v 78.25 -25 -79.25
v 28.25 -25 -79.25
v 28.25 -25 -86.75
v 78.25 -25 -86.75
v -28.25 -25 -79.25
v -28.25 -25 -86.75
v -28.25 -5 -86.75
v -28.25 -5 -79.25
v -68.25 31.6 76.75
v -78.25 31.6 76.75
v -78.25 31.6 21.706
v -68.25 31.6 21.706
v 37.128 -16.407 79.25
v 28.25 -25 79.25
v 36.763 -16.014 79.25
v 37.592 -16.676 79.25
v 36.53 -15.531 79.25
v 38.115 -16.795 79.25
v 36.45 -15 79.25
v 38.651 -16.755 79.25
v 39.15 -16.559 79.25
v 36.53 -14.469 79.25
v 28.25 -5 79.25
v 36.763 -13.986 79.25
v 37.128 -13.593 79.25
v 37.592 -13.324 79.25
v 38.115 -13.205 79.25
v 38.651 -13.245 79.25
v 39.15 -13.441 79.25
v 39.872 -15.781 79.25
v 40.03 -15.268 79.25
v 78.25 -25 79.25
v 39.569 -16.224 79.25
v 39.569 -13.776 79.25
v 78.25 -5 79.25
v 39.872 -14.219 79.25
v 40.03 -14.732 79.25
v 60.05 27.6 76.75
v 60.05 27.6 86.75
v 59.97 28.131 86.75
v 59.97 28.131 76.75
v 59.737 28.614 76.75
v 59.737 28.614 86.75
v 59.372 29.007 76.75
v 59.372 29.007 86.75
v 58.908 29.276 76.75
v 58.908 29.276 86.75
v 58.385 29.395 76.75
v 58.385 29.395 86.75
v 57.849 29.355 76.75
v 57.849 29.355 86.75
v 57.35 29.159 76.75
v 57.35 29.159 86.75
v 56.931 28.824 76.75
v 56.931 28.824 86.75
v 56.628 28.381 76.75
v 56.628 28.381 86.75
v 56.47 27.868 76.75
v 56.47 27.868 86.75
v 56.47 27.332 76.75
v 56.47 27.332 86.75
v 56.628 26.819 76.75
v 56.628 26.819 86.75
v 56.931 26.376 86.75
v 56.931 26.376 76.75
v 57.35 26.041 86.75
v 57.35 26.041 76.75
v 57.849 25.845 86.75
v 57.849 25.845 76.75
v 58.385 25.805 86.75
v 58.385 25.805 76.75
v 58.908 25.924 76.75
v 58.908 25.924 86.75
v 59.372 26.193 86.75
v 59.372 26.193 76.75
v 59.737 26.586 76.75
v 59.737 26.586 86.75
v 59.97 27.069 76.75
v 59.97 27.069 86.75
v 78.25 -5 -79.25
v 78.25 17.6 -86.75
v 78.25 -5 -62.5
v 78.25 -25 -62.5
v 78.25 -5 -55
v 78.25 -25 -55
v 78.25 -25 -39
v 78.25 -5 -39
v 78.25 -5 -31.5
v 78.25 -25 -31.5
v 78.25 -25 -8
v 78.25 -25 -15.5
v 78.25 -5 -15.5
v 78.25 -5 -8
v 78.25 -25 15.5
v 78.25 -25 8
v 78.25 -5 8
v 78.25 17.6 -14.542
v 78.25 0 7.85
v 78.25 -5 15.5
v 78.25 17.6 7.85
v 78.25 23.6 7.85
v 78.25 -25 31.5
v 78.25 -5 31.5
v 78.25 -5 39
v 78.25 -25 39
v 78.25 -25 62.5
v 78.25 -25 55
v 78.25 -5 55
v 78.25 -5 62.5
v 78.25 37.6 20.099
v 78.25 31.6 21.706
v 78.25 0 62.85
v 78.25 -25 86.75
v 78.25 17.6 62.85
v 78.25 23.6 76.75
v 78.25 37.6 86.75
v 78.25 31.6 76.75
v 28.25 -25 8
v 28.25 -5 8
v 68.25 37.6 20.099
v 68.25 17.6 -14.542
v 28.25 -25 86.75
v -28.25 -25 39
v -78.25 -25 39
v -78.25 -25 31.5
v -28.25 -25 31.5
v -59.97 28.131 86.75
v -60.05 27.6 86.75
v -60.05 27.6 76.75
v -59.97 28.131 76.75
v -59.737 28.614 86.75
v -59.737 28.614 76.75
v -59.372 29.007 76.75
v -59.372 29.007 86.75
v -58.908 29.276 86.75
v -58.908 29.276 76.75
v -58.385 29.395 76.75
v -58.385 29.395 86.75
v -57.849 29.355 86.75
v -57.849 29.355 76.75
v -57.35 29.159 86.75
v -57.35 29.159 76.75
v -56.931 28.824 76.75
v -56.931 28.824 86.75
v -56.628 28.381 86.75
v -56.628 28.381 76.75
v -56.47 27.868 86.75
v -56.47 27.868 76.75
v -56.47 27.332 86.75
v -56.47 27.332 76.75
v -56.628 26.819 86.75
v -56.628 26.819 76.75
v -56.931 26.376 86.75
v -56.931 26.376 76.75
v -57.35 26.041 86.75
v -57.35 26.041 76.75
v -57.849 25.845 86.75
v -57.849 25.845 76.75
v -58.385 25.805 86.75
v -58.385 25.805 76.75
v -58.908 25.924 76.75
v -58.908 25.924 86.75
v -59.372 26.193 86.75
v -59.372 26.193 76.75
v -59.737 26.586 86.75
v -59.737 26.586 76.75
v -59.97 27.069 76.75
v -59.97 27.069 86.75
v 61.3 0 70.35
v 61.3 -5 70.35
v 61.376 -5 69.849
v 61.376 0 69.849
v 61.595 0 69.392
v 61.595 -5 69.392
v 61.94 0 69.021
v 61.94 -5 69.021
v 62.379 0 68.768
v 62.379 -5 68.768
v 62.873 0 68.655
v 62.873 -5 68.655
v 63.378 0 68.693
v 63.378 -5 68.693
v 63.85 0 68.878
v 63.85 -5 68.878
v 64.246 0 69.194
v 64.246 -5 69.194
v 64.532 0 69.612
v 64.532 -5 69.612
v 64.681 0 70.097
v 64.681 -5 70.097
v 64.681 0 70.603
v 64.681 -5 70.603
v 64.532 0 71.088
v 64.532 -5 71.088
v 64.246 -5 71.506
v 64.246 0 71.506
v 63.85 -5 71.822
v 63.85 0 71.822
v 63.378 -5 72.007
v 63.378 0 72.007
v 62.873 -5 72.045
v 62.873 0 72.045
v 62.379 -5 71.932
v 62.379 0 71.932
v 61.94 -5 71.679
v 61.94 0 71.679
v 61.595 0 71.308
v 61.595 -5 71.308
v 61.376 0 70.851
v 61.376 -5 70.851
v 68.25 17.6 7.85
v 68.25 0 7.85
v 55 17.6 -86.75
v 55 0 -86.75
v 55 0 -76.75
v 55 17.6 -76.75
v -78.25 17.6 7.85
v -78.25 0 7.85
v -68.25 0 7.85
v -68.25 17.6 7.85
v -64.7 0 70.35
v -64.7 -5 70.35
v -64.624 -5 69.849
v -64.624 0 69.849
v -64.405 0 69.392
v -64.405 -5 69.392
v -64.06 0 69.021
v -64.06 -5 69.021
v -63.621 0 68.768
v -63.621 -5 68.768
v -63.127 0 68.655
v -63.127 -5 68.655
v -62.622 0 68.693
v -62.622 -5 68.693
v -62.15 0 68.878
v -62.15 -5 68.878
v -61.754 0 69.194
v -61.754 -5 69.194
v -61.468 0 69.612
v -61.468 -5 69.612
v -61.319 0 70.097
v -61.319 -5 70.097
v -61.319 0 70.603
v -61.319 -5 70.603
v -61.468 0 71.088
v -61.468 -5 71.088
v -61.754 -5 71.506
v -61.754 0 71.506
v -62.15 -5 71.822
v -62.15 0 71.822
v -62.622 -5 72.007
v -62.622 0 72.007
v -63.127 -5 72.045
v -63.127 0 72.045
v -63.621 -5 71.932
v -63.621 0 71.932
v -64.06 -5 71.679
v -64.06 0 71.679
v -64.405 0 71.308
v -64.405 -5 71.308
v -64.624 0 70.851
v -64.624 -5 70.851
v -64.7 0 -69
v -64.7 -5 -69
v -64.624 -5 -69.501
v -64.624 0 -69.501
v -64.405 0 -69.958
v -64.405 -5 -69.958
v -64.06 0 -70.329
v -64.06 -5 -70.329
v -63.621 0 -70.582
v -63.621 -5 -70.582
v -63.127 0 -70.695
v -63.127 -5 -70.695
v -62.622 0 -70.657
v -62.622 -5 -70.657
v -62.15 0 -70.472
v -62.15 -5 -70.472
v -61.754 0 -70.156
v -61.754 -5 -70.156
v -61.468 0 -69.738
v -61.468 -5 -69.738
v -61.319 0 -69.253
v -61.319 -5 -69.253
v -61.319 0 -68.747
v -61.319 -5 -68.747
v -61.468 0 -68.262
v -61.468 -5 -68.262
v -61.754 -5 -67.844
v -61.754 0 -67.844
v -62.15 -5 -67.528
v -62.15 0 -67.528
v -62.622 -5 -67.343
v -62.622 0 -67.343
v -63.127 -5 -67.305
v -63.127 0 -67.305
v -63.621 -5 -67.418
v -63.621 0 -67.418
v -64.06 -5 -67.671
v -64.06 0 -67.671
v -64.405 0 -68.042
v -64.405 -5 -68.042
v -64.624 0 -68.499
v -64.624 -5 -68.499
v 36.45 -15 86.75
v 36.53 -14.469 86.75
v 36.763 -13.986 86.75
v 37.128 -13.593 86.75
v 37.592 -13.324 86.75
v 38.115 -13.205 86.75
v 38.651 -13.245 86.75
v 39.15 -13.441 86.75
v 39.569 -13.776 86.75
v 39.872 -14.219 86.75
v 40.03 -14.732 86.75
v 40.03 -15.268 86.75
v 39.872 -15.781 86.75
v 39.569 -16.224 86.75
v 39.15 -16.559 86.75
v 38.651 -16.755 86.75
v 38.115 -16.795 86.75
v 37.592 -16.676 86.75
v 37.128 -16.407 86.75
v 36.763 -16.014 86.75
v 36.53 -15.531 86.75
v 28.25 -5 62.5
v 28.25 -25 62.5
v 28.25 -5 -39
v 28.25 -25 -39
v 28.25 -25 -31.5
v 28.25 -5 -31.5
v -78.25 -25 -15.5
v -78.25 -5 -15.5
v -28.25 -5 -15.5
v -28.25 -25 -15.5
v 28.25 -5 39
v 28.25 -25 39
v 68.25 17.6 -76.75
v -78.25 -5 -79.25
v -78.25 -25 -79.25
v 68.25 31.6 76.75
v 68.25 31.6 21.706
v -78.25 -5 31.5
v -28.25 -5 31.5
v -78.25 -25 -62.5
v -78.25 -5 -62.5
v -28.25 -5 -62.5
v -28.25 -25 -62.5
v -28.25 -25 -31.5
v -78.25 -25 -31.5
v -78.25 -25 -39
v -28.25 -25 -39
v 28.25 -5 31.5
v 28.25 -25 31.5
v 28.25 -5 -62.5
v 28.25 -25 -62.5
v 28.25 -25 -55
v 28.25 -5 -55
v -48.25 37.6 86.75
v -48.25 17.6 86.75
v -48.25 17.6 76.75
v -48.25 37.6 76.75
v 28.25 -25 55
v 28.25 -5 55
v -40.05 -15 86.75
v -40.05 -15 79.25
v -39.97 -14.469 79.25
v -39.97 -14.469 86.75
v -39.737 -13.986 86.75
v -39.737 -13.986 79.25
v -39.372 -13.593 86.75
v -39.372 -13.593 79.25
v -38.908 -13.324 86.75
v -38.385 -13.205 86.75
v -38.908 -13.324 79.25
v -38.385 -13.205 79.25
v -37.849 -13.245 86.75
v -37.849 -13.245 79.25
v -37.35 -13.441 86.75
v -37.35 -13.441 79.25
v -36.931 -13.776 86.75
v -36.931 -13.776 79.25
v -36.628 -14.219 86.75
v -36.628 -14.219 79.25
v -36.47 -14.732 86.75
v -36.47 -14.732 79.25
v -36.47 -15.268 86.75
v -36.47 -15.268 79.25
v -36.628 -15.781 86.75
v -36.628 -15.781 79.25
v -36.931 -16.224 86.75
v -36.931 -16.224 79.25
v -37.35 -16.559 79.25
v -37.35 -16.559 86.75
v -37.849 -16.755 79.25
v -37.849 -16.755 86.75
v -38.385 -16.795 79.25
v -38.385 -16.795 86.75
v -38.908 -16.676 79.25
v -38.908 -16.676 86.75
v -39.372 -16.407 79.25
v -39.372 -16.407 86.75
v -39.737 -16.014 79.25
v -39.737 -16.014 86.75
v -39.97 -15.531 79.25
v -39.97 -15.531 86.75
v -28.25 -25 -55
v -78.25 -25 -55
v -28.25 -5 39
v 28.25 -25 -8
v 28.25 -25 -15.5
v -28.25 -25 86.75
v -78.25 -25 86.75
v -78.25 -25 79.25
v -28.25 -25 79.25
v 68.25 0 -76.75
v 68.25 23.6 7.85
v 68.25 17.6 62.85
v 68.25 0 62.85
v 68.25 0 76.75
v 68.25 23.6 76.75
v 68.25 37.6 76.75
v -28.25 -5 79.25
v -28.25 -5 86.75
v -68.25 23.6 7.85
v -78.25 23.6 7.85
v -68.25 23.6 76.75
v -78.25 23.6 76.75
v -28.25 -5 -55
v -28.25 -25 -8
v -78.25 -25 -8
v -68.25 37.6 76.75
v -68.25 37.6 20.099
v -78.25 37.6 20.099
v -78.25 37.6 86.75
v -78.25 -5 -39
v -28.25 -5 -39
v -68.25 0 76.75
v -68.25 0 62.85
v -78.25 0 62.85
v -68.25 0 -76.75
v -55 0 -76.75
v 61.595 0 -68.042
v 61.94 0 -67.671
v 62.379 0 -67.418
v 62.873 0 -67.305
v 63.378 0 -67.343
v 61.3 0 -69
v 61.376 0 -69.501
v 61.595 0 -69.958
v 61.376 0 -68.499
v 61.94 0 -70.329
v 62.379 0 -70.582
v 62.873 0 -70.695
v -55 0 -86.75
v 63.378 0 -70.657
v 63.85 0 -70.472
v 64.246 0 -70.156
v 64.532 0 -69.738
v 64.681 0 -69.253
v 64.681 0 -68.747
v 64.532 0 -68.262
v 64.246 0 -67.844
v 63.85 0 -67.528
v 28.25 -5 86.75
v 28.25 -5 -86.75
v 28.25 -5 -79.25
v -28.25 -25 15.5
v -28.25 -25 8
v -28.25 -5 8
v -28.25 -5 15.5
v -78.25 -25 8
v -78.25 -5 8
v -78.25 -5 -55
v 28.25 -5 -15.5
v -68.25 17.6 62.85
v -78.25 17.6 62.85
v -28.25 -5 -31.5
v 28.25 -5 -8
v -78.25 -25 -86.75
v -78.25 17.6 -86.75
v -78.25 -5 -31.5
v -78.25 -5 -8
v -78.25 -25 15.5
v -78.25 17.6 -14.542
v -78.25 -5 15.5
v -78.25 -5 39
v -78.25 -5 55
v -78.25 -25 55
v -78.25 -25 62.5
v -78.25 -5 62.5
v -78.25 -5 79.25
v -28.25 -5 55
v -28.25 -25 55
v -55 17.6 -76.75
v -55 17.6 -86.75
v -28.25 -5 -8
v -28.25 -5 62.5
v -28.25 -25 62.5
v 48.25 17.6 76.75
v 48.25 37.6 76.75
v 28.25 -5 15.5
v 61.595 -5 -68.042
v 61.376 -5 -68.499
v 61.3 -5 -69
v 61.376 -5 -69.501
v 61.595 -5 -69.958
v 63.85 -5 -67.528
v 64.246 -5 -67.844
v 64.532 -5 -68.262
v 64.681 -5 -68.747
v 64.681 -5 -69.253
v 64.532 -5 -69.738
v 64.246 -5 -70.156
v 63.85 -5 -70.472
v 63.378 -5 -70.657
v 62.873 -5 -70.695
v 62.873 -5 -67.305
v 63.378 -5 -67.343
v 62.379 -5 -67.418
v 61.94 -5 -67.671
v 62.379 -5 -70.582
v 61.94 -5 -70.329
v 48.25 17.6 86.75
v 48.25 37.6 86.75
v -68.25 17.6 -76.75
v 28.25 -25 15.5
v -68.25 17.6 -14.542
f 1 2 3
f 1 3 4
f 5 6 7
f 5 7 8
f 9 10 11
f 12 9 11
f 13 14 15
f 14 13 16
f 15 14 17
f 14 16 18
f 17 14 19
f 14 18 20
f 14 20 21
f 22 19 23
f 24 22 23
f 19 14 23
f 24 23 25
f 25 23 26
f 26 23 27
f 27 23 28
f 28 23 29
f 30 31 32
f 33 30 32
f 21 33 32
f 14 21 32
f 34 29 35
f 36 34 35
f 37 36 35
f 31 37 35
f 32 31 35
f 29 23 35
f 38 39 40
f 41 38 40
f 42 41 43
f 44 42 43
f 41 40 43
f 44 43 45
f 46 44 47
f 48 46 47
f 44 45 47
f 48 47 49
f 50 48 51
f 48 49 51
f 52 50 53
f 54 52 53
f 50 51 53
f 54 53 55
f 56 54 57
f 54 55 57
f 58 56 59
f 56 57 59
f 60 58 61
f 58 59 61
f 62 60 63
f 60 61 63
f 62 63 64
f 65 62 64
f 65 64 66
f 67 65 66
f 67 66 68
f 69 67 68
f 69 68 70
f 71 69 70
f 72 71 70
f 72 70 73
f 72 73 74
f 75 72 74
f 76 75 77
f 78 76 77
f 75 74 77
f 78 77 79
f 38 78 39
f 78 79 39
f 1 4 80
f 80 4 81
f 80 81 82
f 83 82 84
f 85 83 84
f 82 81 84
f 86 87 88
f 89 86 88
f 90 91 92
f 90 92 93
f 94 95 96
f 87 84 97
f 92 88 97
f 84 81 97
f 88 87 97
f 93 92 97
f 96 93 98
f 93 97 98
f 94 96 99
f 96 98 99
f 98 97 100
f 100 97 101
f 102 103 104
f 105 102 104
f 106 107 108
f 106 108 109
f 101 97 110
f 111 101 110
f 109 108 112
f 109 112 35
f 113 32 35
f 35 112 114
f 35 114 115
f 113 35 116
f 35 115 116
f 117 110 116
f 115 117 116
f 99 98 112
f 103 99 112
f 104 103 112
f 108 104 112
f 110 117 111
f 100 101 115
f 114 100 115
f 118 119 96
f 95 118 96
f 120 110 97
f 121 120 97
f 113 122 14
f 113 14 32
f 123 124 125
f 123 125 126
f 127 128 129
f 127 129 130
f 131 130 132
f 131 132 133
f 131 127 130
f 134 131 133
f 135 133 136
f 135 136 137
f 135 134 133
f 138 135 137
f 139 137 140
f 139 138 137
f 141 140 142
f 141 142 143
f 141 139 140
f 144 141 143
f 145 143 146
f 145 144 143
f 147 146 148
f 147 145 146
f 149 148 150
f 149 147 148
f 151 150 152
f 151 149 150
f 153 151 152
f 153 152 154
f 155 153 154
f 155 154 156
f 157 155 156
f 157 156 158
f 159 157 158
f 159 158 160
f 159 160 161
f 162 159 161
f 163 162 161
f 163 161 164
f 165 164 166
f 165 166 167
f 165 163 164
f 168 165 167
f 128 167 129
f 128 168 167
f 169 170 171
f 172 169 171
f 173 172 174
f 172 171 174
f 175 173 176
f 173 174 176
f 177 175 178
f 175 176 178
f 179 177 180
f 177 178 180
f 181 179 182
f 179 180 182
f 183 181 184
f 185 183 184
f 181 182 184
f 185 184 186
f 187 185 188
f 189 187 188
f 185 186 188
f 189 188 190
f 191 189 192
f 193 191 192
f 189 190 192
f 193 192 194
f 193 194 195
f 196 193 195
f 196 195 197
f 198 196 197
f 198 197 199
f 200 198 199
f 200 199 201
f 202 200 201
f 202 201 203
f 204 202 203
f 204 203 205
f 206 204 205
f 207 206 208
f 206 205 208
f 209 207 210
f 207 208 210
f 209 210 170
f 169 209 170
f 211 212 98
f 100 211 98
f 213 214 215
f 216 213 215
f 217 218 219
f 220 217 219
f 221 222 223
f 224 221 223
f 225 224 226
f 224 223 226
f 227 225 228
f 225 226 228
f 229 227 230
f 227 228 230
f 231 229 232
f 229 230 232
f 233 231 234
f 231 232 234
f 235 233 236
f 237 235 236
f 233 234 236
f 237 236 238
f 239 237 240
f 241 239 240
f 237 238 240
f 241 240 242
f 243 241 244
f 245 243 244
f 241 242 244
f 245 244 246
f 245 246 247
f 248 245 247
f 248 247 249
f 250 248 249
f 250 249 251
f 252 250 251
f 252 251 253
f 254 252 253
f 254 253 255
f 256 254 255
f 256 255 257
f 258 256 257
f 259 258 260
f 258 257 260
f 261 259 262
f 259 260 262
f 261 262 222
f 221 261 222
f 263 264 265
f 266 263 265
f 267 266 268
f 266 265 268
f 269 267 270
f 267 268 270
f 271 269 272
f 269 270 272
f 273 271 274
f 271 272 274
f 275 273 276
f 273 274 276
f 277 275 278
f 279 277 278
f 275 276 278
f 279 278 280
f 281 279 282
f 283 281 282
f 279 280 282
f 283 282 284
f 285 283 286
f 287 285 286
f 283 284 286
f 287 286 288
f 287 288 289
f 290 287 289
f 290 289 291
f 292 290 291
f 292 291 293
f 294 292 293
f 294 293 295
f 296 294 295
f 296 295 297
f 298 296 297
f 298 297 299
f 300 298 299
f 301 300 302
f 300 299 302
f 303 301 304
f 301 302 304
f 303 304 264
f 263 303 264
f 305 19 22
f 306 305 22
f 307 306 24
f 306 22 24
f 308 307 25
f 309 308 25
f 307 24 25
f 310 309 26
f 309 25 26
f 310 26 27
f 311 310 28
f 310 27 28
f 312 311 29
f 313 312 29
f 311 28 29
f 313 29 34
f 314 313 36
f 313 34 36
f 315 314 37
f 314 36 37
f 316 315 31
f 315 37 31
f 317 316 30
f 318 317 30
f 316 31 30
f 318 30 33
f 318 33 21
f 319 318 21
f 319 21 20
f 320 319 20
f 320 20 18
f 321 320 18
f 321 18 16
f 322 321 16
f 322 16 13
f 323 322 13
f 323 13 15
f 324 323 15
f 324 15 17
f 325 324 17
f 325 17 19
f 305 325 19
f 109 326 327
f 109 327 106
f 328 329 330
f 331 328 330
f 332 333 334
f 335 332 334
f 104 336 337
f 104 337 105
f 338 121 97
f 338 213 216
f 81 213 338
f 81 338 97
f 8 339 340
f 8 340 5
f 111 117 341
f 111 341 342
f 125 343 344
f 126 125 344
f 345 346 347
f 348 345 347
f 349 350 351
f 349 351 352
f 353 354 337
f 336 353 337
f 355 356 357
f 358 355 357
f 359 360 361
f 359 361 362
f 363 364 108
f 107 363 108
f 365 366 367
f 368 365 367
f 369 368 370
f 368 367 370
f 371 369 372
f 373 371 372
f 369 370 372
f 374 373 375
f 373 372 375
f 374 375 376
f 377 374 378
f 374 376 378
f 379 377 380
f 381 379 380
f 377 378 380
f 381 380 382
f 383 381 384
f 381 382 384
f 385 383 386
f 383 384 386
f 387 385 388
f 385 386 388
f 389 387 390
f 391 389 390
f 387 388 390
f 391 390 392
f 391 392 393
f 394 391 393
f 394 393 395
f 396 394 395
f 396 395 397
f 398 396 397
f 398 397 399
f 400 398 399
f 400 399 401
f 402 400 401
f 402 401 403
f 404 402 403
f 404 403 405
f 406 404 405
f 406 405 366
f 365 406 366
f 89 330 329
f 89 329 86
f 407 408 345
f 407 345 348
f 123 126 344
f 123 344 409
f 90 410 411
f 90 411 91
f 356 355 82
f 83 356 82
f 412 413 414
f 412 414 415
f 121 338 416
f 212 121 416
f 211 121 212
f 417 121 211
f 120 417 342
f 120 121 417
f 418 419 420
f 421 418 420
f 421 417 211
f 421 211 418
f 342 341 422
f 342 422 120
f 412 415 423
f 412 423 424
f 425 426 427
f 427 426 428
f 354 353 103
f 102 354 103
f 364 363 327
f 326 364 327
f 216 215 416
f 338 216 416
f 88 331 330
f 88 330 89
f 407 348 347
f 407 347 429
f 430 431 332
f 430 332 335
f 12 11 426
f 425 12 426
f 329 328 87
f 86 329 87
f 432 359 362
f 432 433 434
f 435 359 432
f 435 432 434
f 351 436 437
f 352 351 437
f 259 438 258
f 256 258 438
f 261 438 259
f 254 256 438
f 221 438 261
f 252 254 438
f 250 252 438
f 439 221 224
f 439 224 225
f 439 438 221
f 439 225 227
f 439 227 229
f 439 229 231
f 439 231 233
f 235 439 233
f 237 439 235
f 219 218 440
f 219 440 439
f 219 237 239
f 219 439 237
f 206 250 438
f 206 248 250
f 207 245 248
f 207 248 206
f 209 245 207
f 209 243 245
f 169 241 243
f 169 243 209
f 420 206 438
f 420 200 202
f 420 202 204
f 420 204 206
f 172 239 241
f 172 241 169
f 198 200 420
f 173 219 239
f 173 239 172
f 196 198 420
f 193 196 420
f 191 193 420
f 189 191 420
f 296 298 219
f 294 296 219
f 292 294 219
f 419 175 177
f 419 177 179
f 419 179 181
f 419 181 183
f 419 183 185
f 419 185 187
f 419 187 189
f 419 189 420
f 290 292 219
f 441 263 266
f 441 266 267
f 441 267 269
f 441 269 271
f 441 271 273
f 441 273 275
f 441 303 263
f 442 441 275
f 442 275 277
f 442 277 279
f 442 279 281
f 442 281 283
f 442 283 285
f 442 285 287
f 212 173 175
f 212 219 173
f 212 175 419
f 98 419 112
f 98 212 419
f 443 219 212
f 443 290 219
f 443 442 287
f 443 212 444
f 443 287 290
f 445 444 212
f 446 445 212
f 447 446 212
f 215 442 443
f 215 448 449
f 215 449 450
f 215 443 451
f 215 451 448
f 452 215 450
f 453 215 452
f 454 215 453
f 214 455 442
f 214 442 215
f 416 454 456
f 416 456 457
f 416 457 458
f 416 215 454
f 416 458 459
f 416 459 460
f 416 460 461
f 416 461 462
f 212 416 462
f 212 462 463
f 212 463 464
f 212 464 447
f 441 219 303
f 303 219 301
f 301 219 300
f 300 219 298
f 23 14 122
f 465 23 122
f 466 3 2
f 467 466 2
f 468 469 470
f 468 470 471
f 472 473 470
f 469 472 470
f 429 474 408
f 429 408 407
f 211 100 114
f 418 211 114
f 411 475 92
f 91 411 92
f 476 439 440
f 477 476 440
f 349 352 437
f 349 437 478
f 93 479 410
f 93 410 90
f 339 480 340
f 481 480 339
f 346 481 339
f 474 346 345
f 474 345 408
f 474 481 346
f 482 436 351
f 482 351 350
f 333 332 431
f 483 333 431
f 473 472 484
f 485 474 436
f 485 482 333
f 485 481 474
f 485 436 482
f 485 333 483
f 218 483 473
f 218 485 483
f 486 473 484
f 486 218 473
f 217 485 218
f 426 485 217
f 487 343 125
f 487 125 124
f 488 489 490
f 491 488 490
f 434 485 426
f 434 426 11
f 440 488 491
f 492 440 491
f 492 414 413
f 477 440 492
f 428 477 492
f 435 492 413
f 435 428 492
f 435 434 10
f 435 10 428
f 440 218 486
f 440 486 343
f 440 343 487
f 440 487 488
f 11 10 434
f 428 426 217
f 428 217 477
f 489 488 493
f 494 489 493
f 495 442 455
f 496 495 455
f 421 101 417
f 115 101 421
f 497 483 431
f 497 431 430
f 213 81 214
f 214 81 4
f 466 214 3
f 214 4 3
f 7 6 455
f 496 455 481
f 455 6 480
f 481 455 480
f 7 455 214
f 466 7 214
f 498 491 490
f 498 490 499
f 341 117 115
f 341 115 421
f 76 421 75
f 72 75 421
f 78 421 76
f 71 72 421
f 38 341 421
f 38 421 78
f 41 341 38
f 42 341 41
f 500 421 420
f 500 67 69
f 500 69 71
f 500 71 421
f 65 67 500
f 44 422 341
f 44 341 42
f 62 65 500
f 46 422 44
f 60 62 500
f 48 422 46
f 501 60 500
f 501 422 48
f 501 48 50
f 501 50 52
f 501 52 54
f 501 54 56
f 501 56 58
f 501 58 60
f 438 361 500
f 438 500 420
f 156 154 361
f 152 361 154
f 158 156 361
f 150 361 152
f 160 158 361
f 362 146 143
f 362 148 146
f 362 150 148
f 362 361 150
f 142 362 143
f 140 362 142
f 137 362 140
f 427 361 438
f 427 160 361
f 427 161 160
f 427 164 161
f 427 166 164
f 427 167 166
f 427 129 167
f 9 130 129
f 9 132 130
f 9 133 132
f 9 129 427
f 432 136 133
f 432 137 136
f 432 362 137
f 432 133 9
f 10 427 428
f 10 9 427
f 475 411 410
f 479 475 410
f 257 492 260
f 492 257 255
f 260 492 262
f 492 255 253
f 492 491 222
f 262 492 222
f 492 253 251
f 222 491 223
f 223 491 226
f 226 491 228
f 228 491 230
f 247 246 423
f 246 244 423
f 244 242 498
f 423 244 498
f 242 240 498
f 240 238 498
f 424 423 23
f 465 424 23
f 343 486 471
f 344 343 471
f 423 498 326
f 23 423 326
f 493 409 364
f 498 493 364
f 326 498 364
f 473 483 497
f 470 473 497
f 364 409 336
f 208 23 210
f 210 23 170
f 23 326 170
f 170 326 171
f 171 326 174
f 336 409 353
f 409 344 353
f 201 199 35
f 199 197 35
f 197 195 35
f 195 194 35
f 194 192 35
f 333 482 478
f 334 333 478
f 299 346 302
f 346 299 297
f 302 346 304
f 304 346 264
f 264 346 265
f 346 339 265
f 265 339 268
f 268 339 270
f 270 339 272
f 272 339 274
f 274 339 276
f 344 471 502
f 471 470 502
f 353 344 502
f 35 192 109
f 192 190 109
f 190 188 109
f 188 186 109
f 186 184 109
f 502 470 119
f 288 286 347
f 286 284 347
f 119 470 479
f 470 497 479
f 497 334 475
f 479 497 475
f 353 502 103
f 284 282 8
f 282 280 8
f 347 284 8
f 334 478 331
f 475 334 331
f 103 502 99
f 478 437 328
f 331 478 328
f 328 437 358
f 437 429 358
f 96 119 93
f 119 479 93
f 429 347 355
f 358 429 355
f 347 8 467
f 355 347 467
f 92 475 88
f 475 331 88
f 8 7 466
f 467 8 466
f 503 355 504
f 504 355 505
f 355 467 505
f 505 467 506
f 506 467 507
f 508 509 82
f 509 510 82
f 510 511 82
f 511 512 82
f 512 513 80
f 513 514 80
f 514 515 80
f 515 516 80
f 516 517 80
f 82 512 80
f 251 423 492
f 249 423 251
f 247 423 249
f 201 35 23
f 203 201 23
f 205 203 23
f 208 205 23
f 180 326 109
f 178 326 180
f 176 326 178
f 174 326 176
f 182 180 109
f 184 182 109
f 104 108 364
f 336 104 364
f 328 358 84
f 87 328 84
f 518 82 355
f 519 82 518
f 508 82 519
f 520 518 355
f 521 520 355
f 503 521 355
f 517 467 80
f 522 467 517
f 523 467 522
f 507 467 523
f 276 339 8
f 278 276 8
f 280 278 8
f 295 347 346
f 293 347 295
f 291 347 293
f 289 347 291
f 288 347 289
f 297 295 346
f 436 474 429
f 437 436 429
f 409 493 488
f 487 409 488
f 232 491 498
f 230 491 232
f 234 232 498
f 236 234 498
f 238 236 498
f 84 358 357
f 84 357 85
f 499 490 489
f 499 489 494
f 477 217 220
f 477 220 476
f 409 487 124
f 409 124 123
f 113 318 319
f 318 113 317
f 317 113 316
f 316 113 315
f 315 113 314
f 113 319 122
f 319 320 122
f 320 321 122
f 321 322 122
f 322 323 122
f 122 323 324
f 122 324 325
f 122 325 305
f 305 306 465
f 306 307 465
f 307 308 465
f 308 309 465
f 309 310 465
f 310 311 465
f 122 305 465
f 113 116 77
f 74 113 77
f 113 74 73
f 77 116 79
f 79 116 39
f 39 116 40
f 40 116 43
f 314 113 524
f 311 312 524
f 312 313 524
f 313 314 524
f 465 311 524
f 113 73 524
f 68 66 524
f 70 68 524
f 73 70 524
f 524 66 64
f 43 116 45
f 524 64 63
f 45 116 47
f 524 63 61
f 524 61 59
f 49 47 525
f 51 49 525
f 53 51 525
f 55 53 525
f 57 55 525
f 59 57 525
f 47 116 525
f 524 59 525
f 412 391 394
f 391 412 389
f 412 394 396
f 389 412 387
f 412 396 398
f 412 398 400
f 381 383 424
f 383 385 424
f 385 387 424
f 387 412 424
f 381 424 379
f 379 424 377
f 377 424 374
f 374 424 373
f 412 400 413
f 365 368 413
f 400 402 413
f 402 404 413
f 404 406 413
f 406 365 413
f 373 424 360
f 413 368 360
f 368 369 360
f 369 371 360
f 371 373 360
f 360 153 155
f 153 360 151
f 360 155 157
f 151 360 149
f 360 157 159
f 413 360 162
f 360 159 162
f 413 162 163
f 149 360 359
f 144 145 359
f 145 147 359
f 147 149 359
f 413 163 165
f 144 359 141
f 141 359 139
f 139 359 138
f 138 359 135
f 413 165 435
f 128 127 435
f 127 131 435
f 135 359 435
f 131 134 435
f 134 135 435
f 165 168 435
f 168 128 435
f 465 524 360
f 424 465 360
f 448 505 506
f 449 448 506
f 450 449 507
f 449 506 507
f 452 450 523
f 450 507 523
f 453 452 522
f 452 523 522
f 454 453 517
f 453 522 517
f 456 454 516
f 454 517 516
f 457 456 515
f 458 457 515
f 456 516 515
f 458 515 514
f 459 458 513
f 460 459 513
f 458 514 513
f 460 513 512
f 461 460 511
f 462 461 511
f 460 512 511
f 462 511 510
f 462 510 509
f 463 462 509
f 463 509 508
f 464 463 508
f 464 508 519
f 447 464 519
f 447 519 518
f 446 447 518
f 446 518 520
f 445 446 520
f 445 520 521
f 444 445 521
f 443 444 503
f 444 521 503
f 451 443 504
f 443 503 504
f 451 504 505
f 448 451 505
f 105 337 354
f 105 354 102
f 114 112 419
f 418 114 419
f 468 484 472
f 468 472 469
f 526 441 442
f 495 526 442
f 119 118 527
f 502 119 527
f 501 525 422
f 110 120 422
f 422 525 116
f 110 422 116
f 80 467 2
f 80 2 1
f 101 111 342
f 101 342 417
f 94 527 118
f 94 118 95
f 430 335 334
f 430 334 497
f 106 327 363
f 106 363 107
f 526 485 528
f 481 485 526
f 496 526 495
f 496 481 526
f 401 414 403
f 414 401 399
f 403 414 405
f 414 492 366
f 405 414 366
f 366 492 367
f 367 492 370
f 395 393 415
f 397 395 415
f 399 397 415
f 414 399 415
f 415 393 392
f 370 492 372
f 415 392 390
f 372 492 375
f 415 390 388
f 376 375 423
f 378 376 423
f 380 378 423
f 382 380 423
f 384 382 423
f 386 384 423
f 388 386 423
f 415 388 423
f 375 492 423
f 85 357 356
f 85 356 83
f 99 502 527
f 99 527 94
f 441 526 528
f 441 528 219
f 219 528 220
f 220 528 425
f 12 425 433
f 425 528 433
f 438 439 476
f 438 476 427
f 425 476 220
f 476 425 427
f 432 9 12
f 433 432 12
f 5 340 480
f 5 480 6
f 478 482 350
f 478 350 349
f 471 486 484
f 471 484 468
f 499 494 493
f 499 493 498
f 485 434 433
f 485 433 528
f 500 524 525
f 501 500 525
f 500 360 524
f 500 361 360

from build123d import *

# Parameters (mm, degrees)
SKETCH1_W            = 156.5
SKETCH1_H            = 173.5
BOSS_EXTRUDE1_DEPTH  = 5
BOSS_EXTRUDE2_DEPTH  = 17.6
M3_CLEARANCE_HOLE1_D = 3.4
SKETCH6_W            = 50
SKETCH6_H            = 7.5
BOSS_EXTRUDE3_DEPTH  = 20
BOSS_EXTRUDE5_DEPTH  = 10
SKETCH8_W            = 20
SKETCH8_H            = 20
SKETCH8_R            = 1.8
BOSS_EXTRUDE6_DEPTH  = 10
SKETCH9_R            = 1.8
CUT_EXTRUDE1_DEPTH   = 8.5


with BuildPart() as part:
    # Sketch1 → Boss-Extrude1 (new body)
    with BuildSketch(Plane(origin=(0, 0, 0), x_dir=(1, 0, 0), z_dir=(0, 1, 0))):
        Rectangle(SKETCH1_W, SKETCH1_H)
    extrude(amount=-BOSS_EXTRUDE1_DEPTH)

    # Sketch1<2> → Boss-Extrude2 (add)
    with BuildSketch(Plane(origin=(0, 0, 0), x_dir=(1, 0, 0), z_dir=(0, 1, 0))):
        Polygon((-78.25, -7.85), (-68.25, -7.85), (-68.25, 76.75), (-55, 76.75), (-55, 86.75), (-78.25, 86.75), align=None)
        Polygon((68.25, 76.75), (68.25, -7.85), (78.25, -7.85), (78.25, 86.75), (55, 86.75), (55, 76.75), align=None)
        Polygon((68.25, -76.75), (-68.25, -76.75), (-68.25, -62.85), (-78.25, -62.85), (-78.25, -86.75), (78.25, -86.75), (78.25, -62.85), (68.25, -62.85), align=None)
    extrude(amount=BOSS_EXTRUDE2_DEPTH)

    # M3 Clearance Hole1 (through all)
    with Locations(Plane(origin=(0, 0, 0), x_dir=(1, 0, 0), z_dir=(0, 1, 0))):
        with Locations((-63, 69), (-63, -70.35), (63, -70.35), (63, 69)):
            Hole(M3_CLEARANCE_HOLE1_D / 2)

    # Sketch6 → Boss-Extrude3 (add)
    with BuildSketch(Plane.XZ.offset(5)):
        with Locations((-53.25, 83)):
            Rectangle(SKETCH6_W, SKETCH6_H)
        with Locations((-53.25, 58.75)):
            Rectangle(SKETCH6_W, SKETCH6_H)
        with Locations((-53.25, 35.25)):
            Rectangle(SKETCH6_W, SKETCH6_H)
        with Locations((-53.25, 11.75)):
            Rectangle(SKETCH6_W, SKETCH6_H)
        with Locations((53.25, 11.75)):
            Rectangle(SKETCH6_W, SKETCH6_H)
        with Locations((53.25, 35.25)):
            Rectangle(SKETCH6_W, SKETCH6_H)
        with Locations((53.25, 58.75)):
            Rectangle(SKETCH6_W, SKETCH6_H)
        with Locations((53.25, 83)):
            Rectangle(SKETCH6_W, SKETCH6_H)
        with Locations((53.25, -83)):
            Rectangle(SKETCH6_W, SKETCH6_H)
        with Locations((53.25, -58.75)):
            Rectangle(SKETCH6_W, SKETCH6_H)
        with Locations((53.25, -35.25)):
            Rectangle(SKETCH6_W, SKETCH6_H)
        with Locations((53.25, -11.75)):
            Rectangle(SKETCH6_W, SKETCH6_H)
        with Locations((-53.25, -11.75)):
            Rectangle(SKETCH6_W, SKETCH6_H)
        with Locations((-53.25, -35.25)):
            Rectangle(SKETCH6_W, SKETCH6_H)
        with Locations((-53.25, -58.75)):
            Rectangle(SKETCH6_W, SKETCH6_H)
        with Locations((-53.25, -83)):
            Rectangle(SKETCH6_W, SKETCH6_H)
    extrude(amount=BOSS_EXTRUDE3_DEPTH)

    # Sketch7 → Boss-Extrude5 (add)
    with BuildSketch(Plane(origin=(78.25, 0, 0), x_dir=(0, 0, -1), z_dir=(1, 0, 0))):
        Polygon((-86.75, 17.6), (-86.75, 37.6), (-20.098711306, 37.6), (14.542304845, 17.6), align=None)
        Polygon((-76.75, 31.6), (-21.706406461, 31.6), (-7.85, 23.6), (-76.75, 23.6), align=None, mode=Mode.SUBTRACT)
    extrude(amount=-BOSS_EXTRUDE5_DEPTH)

    # Sketch8 → Boss-Extrude6 (add)
    with BuildSketch(Plane.XY.offset(86.75)):
        with Locations((58.25, 27.6)):
            Rectangle(SKETCH8_W, SKETCH8_H)
        with Locations((58.25, 27.6)):
            Circle(SKETCH8_R, mode=Mode.SUBTRACT)
    extrude(amount=-BOSS_EXTRUDE6_DEPTH)

    # Mirror2: part across plane


with BuildPart() as part_1:
    add(part.part)
    add(part.part.mirror(Plane(origin=(0, 0, 0), x_dir=(0, 0, 1), z_dir=(1, 0, 0))))

    # Sketch9 → Cut-Extrude1 (cut, through all)
    with BuildSketch(Plane(origin=(0, 0, 79.25), x_dir=(-1, 0, 0), z_dir=(0, 0, -1))):
        with Locations((-38.25, -15)):
            Circle(SKETCH9_R)
        with Locations((38.25, -15)):
            Circle(SKETCH9_R)
    extrude(amount=-CUT_EXTRUDE1_DEPTH, mode=Mode.SUBTRACT)


solid = part_1.part
